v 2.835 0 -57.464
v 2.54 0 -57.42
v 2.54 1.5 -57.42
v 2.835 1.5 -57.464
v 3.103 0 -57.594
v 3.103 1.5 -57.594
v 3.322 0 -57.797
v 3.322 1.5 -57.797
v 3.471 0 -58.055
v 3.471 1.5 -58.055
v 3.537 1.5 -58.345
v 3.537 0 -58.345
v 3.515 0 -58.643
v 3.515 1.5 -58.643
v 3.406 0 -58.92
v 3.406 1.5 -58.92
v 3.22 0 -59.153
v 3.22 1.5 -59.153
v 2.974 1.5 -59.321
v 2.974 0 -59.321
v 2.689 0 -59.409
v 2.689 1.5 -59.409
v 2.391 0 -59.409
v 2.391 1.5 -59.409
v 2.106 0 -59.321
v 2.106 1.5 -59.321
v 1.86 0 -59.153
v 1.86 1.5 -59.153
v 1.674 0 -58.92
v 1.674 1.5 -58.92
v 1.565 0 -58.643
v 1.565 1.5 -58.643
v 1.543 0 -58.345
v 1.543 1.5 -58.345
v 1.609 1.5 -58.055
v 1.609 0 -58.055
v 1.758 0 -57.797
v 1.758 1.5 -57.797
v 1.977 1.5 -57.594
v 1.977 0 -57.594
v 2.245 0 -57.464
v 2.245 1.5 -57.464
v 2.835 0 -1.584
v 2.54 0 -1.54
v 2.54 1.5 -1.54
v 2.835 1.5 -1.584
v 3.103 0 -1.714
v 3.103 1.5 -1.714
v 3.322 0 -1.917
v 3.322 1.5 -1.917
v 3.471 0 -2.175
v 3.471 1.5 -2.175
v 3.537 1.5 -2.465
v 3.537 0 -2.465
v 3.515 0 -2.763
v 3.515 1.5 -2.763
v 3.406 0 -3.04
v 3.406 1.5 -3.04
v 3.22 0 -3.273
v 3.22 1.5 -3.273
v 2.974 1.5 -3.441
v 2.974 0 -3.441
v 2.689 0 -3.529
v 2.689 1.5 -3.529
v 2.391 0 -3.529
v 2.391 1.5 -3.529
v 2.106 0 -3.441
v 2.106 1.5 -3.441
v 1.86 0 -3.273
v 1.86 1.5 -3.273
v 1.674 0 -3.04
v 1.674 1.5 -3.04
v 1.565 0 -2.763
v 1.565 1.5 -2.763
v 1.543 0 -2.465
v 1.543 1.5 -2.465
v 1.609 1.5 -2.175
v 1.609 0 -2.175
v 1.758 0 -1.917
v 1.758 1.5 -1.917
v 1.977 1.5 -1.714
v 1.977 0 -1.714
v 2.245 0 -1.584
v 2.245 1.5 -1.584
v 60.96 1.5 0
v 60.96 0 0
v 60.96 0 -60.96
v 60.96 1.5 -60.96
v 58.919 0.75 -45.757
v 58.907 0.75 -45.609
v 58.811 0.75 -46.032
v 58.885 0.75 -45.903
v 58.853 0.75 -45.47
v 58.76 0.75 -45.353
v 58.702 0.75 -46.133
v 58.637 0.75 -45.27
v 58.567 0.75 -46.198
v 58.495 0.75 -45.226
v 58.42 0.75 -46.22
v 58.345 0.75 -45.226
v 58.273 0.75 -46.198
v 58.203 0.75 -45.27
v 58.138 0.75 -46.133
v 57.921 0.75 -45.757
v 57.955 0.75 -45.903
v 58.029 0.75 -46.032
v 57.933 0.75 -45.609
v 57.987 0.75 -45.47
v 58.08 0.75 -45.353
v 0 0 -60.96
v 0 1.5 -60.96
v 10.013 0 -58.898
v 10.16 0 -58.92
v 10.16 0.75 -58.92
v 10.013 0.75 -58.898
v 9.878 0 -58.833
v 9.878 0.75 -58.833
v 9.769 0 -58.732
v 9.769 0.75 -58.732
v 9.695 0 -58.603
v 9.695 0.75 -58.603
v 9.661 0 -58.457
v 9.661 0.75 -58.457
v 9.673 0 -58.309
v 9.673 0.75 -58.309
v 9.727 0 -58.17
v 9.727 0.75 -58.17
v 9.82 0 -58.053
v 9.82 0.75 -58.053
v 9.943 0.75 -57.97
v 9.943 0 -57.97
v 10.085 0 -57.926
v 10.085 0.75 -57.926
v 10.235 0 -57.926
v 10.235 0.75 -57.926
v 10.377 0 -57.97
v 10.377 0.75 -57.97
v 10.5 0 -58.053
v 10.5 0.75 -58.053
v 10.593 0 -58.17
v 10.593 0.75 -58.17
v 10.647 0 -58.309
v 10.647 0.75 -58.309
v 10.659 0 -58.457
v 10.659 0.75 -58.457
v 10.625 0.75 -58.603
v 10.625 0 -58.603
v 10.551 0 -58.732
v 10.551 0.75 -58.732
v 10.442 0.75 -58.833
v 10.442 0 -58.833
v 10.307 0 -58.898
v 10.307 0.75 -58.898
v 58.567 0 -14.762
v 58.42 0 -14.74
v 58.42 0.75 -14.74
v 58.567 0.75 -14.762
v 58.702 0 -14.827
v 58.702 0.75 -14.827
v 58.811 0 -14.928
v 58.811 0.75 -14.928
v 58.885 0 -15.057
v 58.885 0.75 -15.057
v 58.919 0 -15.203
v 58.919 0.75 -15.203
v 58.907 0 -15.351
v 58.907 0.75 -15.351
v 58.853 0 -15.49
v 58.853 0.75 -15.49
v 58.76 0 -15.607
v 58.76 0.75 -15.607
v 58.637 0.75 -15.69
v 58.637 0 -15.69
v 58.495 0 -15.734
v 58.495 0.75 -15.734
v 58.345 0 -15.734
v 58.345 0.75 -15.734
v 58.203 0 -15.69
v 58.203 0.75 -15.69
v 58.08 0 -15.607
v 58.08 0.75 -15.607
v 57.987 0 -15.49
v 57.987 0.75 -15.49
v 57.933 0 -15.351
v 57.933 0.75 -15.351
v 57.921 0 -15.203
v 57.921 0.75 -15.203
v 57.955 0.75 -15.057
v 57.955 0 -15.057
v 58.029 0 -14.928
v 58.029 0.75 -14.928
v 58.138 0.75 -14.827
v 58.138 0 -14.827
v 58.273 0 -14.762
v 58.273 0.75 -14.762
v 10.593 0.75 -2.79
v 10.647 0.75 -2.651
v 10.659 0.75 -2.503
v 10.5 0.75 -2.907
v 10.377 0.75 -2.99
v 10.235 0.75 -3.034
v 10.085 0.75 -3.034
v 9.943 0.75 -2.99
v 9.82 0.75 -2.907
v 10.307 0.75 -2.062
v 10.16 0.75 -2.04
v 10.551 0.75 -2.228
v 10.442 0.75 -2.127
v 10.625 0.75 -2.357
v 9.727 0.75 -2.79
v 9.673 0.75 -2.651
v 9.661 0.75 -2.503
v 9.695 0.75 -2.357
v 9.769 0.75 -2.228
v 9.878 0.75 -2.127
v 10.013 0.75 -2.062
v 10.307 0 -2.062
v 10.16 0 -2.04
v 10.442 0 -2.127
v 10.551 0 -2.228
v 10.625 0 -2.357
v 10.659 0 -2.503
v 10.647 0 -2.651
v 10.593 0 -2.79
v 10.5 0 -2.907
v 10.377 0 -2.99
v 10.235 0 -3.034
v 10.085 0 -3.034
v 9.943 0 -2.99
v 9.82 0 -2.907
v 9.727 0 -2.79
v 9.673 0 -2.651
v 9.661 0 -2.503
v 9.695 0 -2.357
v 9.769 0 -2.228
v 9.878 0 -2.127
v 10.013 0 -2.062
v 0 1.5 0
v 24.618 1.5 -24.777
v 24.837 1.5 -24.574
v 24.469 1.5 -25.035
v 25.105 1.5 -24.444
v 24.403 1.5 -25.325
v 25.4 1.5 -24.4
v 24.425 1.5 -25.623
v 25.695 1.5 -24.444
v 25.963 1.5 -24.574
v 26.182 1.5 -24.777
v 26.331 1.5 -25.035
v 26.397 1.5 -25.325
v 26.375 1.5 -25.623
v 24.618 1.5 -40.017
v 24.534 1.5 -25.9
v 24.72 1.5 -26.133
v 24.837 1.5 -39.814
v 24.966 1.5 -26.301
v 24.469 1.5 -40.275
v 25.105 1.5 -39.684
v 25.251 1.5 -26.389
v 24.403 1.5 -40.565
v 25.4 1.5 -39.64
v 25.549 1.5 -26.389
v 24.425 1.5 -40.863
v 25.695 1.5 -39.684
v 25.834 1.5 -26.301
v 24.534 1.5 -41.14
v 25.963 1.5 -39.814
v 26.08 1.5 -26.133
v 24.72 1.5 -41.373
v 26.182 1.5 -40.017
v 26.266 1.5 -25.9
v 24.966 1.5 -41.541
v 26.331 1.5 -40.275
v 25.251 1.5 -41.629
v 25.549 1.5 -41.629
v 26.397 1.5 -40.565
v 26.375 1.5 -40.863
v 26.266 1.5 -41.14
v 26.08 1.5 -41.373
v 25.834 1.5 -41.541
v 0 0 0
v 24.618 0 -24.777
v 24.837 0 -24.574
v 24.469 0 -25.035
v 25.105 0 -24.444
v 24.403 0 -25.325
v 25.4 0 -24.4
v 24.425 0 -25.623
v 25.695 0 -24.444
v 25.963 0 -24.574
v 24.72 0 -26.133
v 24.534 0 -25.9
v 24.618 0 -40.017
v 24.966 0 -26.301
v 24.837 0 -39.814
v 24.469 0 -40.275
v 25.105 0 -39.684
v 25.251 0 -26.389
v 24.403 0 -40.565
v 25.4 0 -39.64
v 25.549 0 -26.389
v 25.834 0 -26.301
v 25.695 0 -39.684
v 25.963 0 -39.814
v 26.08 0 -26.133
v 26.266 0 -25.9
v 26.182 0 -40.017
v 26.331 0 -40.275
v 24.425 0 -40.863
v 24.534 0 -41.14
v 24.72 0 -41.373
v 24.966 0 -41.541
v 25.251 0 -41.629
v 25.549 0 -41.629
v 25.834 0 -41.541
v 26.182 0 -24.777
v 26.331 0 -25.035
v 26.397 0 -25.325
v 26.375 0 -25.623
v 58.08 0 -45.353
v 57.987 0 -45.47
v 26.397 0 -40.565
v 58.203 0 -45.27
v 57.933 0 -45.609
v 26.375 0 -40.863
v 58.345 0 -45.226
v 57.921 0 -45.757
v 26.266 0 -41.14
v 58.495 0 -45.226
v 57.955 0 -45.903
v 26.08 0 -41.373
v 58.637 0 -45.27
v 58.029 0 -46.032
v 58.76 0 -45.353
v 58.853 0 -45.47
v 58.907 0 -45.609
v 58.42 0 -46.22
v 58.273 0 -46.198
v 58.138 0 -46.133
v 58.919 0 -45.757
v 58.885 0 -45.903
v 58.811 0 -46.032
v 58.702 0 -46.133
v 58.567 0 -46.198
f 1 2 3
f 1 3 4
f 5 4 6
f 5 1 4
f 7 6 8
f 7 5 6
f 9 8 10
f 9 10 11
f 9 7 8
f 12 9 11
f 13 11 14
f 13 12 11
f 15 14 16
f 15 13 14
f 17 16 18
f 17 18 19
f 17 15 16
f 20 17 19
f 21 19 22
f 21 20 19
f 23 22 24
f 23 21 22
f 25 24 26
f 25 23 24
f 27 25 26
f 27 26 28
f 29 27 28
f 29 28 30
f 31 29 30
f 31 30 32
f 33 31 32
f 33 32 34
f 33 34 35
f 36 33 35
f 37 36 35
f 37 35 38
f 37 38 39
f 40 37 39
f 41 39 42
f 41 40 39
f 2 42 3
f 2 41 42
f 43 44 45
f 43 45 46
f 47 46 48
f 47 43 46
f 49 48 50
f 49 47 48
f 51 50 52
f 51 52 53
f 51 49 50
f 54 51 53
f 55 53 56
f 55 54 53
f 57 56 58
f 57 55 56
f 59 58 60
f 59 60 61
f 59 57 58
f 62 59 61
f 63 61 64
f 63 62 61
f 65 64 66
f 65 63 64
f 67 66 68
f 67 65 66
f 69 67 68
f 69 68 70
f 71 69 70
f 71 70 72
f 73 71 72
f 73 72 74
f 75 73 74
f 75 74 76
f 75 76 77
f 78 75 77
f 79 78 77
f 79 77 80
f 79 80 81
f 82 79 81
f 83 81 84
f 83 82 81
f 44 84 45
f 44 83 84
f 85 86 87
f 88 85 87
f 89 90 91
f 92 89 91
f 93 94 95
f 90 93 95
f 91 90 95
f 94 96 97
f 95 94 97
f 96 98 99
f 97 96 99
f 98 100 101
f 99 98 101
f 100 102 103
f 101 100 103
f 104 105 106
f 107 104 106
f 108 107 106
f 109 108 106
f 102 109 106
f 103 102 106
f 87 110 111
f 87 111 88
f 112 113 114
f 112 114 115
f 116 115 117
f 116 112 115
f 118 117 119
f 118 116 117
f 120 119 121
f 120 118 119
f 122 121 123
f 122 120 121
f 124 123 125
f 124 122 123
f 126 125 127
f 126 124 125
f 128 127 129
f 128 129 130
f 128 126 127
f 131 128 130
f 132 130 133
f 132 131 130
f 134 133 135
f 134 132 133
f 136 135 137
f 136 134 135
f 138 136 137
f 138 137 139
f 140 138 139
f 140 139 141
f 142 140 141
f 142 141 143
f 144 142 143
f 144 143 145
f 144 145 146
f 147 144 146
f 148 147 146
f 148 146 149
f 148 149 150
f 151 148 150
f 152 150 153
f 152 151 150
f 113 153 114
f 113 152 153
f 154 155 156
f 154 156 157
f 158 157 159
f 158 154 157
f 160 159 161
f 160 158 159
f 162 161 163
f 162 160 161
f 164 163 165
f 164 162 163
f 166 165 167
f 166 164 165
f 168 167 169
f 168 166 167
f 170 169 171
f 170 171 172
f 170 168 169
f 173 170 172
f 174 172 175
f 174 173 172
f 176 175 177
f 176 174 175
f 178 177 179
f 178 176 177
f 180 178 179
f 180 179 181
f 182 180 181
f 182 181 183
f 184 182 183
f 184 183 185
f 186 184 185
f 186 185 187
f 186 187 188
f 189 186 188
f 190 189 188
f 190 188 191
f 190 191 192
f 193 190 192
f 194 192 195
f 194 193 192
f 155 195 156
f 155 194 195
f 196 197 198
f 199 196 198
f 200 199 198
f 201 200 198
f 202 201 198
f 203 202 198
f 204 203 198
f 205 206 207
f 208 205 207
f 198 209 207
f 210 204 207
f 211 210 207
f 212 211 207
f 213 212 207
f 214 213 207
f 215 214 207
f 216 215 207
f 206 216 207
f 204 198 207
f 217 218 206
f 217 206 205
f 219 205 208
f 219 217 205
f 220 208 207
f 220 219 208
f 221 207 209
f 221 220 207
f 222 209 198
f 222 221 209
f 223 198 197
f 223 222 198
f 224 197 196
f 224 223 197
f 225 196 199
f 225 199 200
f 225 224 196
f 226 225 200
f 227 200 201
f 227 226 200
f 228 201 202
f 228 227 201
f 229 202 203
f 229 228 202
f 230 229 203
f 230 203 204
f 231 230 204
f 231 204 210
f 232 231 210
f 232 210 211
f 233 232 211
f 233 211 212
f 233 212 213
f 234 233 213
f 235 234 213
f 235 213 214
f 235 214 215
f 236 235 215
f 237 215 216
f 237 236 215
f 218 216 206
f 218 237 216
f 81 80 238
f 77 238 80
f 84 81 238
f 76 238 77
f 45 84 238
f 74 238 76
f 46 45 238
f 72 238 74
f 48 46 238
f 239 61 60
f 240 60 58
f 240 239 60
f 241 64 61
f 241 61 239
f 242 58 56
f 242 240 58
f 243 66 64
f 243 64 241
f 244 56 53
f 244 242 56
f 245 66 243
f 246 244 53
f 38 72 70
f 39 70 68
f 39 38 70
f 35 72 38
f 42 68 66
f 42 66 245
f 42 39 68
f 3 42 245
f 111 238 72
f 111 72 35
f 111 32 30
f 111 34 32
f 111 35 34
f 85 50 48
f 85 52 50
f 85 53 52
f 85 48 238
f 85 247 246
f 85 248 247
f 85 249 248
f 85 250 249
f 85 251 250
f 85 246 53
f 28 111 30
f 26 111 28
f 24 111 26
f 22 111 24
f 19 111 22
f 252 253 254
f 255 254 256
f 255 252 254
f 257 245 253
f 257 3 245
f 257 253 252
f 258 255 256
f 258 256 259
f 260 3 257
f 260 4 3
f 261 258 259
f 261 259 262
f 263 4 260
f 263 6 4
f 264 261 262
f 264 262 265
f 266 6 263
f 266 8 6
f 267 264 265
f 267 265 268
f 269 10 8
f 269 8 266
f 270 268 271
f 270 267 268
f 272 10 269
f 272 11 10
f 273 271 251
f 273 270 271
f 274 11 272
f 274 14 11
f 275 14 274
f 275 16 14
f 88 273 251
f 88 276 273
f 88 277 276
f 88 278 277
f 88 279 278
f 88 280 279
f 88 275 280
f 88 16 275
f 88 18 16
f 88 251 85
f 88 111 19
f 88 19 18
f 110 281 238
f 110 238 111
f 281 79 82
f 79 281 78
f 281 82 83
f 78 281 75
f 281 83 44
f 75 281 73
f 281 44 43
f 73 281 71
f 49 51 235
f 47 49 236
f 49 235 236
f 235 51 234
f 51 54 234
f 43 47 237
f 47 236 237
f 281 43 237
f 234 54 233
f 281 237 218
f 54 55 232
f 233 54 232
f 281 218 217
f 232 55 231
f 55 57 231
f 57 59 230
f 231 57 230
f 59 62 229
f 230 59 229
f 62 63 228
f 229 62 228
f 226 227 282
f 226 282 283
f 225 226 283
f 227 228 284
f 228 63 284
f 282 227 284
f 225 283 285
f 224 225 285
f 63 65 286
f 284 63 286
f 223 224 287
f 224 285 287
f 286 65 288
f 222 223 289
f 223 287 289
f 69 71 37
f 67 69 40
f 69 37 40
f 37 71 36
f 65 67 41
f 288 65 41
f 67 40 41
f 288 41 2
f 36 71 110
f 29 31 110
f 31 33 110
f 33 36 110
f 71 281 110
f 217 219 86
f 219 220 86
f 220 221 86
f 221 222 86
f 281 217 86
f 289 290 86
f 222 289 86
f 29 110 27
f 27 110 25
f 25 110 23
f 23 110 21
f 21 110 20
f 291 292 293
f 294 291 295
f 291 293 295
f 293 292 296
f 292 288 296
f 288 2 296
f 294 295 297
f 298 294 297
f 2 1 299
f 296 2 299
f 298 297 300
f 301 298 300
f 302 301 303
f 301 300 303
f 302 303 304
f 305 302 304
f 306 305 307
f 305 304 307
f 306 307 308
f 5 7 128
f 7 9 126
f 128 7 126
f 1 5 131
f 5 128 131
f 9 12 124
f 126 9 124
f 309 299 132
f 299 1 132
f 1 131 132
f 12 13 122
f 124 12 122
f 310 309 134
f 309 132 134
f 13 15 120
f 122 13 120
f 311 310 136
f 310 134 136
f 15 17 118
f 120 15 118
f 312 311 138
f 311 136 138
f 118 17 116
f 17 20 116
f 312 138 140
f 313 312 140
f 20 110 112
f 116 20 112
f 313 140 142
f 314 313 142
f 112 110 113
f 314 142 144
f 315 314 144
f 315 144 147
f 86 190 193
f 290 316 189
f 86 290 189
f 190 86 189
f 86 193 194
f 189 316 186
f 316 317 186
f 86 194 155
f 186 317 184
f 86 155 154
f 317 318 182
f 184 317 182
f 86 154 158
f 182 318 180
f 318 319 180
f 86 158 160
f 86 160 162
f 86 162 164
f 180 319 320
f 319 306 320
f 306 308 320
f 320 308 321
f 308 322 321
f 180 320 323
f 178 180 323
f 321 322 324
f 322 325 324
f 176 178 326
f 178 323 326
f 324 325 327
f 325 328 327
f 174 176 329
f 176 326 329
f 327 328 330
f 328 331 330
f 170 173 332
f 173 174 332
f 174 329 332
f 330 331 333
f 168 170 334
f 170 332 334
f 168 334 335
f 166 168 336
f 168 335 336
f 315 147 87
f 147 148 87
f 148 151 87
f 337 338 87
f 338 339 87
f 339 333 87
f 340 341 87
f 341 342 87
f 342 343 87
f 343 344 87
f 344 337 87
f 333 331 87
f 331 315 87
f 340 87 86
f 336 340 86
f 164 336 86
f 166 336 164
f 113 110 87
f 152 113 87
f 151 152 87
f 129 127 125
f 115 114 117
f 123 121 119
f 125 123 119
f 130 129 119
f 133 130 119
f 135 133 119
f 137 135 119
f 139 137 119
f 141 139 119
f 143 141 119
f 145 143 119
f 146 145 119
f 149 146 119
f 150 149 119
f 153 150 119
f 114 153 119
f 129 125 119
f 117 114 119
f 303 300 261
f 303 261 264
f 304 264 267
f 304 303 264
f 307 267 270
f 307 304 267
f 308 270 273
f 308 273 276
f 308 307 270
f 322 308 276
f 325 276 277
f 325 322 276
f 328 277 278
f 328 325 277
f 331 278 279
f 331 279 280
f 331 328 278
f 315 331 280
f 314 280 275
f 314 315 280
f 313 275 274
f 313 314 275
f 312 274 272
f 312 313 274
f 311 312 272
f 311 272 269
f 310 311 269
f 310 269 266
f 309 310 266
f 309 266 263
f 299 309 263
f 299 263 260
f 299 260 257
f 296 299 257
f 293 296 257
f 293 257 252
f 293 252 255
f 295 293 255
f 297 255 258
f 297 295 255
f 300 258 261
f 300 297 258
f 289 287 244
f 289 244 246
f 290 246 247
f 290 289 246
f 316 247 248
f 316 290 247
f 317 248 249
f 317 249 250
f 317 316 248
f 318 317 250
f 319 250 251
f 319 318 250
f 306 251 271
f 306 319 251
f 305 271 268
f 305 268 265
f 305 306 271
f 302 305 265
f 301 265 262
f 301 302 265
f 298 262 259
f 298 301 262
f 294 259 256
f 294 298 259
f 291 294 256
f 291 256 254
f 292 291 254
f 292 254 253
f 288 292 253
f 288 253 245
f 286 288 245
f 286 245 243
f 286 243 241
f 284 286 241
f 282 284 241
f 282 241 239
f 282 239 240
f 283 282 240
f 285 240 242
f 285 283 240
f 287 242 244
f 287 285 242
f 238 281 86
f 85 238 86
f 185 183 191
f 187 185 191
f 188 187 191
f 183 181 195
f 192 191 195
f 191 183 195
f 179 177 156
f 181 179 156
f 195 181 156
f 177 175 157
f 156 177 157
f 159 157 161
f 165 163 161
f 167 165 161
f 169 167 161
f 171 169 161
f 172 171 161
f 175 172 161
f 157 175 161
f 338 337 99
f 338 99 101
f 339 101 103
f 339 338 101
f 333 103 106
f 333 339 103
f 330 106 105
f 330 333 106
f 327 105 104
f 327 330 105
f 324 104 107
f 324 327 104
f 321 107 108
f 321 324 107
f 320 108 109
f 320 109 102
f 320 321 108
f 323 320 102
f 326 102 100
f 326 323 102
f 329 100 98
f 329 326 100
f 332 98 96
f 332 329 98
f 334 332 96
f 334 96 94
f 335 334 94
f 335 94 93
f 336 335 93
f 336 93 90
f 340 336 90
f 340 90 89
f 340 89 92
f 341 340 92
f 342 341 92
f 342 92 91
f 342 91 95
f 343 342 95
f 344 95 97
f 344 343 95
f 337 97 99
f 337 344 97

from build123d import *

# Parameters (mm, degrees)
SKETCH1_W           = 60.96
SKETCH1_H           = 60.96
SKETCH1_R           = 1
SKETCH1_R_2         = 0.5
BOSS_EXTRUDE1_DEPTH = 1.5
SKETCH1_3_R         = 0.5
CUT_EXTRUDE1_DEPTH  = 0.75


with BuildPart() as part:
    # Sketch1 → Boss-Extrude1 (new body)
    with BuildSketch(Plane(origin=(0, 0, 0), x_dir=(1, 0, 0), z_dir=(0, 1, 0))):
        with Locations((30.48, 30.48)):
            Rectangle(SKETCH1_W, SKETCH1_H)
        with Locations(Location((25.4, 40.64, 0), (0, 0, 270))):  # turned: the seam where the file's is
            Circle(SKETCH1_R, mode=Mode.SUBTRACT)
        with Locations(Location((25.4, 25.4, 0), (0, 0, 270))):  # turned: the seam where the file's is
            Circle(SKETCH1_R, mode=Mode.SUBTRACT)
        with Locations((10.16, 58.42)):
            Circle(SKETCH1_R_2, mode=Mode.SUBTRACT)
        with Locations(Location((2.54, 2.54, 0), (0, 0, 270))):  # turned: the seam where the file's is
            Circle(SKETCH1_R, mode=Mode.SUBTRACT)
        with Locations((10.16, 2.54)):
            Circle(SKETCH1_R_2, mode=Mode.SUBTRACT)
        with Locations((58.42, 15.24)):
            Circle(SKETCH1_R_2, mode=Mode.SUBTRACT)
        with Locations((58.42, 45.72)):
            Circle(SKETCH1_R_2, mode=Mode.SUBTRACT)
        with Locations(Location((2.54, 58.42, 0), (0, 0, 270))):  # turned: the seam where the file's is
            Circle(SKETCH1_R, mode=Mode.SUBTRACT)
        with Locations((10.16, 58.42)):
            Circle(SKETCH1_R_2)
        with Locations((58.42, 45.72)):
            Circle(SKETCH1_R_2)
        with Locations((58.42, 15.24)):
            Circle(SKETCH1_R_2)
        with Locations((10.16, 2.54)):
            Circle(SKETCH1_R_2)
    extrude(amount=BOSS_EXTRUDE1_DEPTH)

    # Sketch1_3 → Cut-Extrude1 (cut)
    with BuildSketch(Plane(origin=(0, 0, 0), x_dir=(1, 0, 0), z_dir=(0, 1, 0))):
        with Locations(Location((10.16, 2.54, 0), (0, 0, 270))):  # turned: the seam where the file's is
            Circle(SKETCH1_3_R)
        with Locations(Location((58.42, 15.24, 0), (0, 0, 270))):  # turned: the seam where the file's is
            Circle(SKETCH1_3_R)
        with Locations(Location((58.42, 45.72, 0), (0, 0, 90))):  # turned: the seam where the file's is
            Circle(SKETCH1_3_R)
        with Locations(Location((10.16, 58.42, 0), (0, 0, 90))):  # turned: the seam where the file's is
            Circle(SKETCH1_3_R)
    extrude(amount=CUT_EXTRUDE1_DEPTH, mode=Mode.SUBTRACT)


solid = part.part
